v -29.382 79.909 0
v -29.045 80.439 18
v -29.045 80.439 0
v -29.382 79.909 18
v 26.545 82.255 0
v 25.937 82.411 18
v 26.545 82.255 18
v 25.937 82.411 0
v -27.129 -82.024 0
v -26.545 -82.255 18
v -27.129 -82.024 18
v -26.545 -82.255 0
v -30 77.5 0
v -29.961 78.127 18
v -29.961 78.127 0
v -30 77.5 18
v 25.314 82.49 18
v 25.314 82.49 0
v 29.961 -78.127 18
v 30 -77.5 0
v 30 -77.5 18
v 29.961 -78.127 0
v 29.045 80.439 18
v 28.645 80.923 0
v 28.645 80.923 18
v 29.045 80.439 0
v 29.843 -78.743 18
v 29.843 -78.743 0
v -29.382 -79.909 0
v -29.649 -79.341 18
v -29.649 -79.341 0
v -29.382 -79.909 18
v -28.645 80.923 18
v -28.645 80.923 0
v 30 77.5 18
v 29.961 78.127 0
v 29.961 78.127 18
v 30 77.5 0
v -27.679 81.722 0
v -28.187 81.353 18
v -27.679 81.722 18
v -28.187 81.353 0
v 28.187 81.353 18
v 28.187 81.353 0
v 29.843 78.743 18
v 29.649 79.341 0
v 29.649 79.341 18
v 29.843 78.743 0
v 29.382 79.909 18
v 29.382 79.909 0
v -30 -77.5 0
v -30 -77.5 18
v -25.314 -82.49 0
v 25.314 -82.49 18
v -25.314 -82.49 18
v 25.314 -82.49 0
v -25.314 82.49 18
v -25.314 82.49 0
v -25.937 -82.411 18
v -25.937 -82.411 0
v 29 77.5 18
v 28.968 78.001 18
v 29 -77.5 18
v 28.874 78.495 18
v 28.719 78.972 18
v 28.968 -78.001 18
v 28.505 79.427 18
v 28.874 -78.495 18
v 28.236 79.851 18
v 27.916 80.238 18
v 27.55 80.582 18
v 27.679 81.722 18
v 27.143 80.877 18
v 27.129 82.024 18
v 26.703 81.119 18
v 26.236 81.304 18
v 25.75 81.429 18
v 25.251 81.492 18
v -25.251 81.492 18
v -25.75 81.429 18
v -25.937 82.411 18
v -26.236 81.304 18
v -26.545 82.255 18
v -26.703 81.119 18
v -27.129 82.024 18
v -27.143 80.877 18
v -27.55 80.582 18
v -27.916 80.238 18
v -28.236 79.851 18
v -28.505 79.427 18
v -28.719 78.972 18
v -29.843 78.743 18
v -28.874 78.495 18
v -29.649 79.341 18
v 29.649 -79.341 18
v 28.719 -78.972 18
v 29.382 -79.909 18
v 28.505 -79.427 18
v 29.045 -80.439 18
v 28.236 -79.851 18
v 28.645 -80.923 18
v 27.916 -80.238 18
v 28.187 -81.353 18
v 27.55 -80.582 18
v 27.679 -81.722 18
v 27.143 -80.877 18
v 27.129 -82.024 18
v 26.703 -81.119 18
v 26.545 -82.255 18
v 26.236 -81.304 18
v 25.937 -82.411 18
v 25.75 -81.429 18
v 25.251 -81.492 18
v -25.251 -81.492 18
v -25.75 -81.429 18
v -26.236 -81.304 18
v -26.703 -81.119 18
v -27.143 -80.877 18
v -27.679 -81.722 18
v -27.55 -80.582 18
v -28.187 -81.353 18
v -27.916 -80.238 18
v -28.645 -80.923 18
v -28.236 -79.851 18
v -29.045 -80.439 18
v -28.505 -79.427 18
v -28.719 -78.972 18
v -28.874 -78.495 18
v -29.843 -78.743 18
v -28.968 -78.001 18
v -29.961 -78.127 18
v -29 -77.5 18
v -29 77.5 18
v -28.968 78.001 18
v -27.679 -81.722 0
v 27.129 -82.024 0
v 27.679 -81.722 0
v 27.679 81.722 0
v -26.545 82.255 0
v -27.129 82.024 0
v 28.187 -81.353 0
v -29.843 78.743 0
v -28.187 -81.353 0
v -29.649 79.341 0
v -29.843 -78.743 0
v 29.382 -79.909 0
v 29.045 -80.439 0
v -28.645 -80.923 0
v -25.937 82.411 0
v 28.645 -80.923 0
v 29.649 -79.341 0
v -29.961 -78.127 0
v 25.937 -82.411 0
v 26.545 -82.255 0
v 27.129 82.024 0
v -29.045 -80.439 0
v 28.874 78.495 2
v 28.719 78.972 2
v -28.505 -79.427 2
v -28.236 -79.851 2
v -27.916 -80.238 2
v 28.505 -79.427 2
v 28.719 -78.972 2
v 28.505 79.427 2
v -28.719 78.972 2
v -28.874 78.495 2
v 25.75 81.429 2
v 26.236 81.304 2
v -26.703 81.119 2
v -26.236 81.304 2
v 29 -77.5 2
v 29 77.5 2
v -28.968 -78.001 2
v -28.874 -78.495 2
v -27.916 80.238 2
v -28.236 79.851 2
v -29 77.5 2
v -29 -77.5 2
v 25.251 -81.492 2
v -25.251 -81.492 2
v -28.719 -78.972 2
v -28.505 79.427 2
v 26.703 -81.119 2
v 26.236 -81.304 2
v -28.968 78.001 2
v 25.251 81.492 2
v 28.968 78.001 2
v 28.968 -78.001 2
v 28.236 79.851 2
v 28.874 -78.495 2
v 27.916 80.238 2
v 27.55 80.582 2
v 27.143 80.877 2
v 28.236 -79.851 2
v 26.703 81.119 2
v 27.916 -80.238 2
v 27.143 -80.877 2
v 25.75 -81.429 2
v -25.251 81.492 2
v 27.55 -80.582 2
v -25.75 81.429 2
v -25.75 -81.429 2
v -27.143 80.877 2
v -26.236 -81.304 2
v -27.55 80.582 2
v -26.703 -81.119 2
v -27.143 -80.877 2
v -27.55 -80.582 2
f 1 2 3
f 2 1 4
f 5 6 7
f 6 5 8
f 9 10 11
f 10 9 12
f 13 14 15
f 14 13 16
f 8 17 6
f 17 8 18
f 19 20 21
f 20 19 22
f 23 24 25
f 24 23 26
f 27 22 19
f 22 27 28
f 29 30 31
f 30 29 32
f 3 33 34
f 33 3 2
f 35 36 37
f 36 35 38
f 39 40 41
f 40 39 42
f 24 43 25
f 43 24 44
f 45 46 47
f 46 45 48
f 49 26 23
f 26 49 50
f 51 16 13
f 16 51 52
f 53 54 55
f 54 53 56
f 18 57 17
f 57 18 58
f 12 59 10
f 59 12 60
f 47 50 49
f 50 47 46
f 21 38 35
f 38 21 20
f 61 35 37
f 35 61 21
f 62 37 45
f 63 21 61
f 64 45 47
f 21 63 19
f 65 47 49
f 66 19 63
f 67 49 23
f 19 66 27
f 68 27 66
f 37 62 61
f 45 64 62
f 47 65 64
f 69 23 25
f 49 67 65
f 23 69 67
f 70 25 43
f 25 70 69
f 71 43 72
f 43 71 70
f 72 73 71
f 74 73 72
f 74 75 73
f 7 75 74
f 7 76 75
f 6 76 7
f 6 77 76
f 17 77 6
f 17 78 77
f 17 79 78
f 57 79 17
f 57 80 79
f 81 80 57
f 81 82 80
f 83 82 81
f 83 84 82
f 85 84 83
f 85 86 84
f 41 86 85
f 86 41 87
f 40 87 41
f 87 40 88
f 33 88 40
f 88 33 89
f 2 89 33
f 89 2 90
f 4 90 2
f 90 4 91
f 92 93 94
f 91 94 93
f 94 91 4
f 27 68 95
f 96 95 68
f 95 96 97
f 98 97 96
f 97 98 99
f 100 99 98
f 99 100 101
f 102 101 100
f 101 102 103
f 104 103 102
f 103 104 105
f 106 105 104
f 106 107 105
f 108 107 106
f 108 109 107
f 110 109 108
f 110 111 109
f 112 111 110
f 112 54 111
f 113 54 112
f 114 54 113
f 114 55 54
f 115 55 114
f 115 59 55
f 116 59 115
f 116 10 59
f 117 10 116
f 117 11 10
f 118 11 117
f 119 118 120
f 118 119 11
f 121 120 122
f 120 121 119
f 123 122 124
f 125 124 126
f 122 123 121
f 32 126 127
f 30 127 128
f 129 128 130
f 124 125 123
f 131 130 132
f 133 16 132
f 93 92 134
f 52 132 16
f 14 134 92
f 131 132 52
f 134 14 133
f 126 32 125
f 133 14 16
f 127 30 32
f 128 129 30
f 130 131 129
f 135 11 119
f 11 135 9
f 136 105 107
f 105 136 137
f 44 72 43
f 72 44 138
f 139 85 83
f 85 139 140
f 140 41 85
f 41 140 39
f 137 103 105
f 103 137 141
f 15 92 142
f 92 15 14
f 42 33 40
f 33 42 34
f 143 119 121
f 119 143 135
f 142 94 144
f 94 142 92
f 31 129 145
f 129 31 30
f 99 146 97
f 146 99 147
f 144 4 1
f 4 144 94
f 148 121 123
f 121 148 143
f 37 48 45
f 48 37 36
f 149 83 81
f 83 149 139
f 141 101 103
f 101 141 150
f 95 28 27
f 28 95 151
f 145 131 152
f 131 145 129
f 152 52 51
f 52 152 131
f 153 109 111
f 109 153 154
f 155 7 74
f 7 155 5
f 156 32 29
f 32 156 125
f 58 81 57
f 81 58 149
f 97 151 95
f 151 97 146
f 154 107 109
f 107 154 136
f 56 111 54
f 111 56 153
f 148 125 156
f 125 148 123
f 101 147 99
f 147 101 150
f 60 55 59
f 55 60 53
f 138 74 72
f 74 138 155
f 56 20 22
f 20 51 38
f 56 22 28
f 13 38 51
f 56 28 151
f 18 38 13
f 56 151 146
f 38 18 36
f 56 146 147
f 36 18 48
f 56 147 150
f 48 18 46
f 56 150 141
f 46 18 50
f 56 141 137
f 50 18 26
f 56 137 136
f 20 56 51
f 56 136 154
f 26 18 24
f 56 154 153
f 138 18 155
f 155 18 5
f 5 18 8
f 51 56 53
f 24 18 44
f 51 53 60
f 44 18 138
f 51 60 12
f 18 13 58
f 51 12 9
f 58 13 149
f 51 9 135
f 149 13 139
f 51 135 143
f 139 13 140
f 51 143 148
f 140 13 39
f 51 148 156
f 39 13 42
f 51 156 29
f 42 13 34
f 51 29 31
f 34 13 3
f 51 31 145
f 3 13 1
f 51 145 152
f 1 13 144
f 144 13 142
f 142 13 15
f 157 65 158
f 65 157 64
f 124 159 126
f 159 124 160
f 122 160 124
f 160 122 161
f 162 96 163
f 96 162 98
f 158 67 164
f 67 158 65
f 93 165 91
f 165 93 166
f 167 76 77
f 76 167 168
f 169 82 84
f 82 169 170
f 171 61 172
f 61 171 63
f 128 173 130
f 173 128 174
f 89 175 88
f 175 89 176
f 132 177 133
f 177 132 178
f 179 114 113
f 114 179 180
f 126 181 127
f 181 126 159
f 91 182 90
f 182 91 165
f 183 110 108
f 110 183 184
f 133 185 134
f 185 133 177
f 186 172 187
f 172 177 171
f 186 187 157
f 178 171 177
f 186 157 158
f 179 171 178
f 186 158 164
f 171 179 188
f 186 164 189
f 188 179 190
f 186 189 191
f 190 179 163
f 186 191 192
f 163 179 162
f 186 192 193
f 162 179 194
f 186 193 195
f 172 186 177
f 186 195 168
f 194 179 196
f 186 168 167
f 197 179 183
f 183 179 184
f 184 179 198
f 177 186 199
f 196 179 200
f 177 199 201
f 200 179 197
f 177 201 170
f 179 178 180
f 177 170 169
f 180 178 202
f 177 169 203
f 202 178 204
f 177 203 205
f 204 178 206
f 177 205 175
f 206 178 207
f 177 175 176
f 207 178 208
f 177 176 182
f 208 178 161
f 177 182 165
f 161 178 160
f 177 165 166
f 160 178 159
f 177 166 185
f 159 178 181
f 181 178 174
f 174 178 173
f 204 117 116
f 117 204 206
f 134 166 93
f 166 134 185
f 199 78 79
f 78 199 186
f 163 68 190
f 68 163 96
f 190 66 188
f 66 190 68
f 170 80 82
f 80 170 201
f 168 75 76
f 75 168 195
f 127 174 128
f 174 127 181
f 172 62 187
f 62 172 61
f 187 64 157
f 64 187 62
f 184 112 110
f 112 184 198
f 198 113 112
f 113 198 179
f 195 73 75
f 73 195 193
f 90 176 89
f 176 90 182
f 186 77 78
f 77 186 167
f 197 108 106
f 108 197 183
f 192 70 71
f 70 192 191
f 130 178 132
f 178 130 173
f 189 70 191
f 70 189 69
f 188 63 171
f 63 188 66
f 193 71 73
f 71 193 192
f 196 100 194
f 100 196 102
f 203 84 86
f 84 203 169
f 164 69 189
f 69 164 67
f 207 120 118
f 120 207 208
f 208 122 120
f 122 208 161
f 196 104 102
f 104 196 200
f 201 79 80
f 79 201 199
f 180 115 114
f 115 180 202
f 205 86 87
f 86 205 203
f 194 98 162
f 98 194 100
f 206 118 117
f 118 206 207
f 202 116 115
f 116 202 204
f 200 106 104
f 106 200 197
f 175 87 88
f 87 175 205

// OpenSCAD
$fn = 50;


difference() {
	union() {
		hull() {
			translate(v = [-25.0000000000, 77.5000000000, 0]) {
				cylinder(h = 18, r = 5);
			}
			translate(v = [25.0000000000, 77.5000000000, 0]) {
				cylinder(h = 18, r = 5);
			}
			translate(v = [-25.0000000000, -77.5000000000, 0]) {
				cylinder(h = 18, r = 5);
			}
			translate(v = [25.0000000000, -77.5000000000, 0]) {
				cylinder(h = 18, r = 5);
			}
		}
	}
	union() {
		translate(v = [0, 0, 2]) {
			hull() {
				translate(v = [-25.0000000000, 77.5000000000, 0]) {
					cylinder(h = 16, r = 4);
				}
				translate(v = [25.0000000000, 77.5000000000, 0]) {
					cylinder(h = 16, r = 4);
				}
				translate(v = [-25.0000000000, -77.5000000000, 0]) {
					cylinder(h = 16, r = 4);
				}
				translate(v = [25.0000000000, -77.5000000000, 0]) {
					cylinder(h = 16, r = 4);
				}
			}
		}
	}
}
